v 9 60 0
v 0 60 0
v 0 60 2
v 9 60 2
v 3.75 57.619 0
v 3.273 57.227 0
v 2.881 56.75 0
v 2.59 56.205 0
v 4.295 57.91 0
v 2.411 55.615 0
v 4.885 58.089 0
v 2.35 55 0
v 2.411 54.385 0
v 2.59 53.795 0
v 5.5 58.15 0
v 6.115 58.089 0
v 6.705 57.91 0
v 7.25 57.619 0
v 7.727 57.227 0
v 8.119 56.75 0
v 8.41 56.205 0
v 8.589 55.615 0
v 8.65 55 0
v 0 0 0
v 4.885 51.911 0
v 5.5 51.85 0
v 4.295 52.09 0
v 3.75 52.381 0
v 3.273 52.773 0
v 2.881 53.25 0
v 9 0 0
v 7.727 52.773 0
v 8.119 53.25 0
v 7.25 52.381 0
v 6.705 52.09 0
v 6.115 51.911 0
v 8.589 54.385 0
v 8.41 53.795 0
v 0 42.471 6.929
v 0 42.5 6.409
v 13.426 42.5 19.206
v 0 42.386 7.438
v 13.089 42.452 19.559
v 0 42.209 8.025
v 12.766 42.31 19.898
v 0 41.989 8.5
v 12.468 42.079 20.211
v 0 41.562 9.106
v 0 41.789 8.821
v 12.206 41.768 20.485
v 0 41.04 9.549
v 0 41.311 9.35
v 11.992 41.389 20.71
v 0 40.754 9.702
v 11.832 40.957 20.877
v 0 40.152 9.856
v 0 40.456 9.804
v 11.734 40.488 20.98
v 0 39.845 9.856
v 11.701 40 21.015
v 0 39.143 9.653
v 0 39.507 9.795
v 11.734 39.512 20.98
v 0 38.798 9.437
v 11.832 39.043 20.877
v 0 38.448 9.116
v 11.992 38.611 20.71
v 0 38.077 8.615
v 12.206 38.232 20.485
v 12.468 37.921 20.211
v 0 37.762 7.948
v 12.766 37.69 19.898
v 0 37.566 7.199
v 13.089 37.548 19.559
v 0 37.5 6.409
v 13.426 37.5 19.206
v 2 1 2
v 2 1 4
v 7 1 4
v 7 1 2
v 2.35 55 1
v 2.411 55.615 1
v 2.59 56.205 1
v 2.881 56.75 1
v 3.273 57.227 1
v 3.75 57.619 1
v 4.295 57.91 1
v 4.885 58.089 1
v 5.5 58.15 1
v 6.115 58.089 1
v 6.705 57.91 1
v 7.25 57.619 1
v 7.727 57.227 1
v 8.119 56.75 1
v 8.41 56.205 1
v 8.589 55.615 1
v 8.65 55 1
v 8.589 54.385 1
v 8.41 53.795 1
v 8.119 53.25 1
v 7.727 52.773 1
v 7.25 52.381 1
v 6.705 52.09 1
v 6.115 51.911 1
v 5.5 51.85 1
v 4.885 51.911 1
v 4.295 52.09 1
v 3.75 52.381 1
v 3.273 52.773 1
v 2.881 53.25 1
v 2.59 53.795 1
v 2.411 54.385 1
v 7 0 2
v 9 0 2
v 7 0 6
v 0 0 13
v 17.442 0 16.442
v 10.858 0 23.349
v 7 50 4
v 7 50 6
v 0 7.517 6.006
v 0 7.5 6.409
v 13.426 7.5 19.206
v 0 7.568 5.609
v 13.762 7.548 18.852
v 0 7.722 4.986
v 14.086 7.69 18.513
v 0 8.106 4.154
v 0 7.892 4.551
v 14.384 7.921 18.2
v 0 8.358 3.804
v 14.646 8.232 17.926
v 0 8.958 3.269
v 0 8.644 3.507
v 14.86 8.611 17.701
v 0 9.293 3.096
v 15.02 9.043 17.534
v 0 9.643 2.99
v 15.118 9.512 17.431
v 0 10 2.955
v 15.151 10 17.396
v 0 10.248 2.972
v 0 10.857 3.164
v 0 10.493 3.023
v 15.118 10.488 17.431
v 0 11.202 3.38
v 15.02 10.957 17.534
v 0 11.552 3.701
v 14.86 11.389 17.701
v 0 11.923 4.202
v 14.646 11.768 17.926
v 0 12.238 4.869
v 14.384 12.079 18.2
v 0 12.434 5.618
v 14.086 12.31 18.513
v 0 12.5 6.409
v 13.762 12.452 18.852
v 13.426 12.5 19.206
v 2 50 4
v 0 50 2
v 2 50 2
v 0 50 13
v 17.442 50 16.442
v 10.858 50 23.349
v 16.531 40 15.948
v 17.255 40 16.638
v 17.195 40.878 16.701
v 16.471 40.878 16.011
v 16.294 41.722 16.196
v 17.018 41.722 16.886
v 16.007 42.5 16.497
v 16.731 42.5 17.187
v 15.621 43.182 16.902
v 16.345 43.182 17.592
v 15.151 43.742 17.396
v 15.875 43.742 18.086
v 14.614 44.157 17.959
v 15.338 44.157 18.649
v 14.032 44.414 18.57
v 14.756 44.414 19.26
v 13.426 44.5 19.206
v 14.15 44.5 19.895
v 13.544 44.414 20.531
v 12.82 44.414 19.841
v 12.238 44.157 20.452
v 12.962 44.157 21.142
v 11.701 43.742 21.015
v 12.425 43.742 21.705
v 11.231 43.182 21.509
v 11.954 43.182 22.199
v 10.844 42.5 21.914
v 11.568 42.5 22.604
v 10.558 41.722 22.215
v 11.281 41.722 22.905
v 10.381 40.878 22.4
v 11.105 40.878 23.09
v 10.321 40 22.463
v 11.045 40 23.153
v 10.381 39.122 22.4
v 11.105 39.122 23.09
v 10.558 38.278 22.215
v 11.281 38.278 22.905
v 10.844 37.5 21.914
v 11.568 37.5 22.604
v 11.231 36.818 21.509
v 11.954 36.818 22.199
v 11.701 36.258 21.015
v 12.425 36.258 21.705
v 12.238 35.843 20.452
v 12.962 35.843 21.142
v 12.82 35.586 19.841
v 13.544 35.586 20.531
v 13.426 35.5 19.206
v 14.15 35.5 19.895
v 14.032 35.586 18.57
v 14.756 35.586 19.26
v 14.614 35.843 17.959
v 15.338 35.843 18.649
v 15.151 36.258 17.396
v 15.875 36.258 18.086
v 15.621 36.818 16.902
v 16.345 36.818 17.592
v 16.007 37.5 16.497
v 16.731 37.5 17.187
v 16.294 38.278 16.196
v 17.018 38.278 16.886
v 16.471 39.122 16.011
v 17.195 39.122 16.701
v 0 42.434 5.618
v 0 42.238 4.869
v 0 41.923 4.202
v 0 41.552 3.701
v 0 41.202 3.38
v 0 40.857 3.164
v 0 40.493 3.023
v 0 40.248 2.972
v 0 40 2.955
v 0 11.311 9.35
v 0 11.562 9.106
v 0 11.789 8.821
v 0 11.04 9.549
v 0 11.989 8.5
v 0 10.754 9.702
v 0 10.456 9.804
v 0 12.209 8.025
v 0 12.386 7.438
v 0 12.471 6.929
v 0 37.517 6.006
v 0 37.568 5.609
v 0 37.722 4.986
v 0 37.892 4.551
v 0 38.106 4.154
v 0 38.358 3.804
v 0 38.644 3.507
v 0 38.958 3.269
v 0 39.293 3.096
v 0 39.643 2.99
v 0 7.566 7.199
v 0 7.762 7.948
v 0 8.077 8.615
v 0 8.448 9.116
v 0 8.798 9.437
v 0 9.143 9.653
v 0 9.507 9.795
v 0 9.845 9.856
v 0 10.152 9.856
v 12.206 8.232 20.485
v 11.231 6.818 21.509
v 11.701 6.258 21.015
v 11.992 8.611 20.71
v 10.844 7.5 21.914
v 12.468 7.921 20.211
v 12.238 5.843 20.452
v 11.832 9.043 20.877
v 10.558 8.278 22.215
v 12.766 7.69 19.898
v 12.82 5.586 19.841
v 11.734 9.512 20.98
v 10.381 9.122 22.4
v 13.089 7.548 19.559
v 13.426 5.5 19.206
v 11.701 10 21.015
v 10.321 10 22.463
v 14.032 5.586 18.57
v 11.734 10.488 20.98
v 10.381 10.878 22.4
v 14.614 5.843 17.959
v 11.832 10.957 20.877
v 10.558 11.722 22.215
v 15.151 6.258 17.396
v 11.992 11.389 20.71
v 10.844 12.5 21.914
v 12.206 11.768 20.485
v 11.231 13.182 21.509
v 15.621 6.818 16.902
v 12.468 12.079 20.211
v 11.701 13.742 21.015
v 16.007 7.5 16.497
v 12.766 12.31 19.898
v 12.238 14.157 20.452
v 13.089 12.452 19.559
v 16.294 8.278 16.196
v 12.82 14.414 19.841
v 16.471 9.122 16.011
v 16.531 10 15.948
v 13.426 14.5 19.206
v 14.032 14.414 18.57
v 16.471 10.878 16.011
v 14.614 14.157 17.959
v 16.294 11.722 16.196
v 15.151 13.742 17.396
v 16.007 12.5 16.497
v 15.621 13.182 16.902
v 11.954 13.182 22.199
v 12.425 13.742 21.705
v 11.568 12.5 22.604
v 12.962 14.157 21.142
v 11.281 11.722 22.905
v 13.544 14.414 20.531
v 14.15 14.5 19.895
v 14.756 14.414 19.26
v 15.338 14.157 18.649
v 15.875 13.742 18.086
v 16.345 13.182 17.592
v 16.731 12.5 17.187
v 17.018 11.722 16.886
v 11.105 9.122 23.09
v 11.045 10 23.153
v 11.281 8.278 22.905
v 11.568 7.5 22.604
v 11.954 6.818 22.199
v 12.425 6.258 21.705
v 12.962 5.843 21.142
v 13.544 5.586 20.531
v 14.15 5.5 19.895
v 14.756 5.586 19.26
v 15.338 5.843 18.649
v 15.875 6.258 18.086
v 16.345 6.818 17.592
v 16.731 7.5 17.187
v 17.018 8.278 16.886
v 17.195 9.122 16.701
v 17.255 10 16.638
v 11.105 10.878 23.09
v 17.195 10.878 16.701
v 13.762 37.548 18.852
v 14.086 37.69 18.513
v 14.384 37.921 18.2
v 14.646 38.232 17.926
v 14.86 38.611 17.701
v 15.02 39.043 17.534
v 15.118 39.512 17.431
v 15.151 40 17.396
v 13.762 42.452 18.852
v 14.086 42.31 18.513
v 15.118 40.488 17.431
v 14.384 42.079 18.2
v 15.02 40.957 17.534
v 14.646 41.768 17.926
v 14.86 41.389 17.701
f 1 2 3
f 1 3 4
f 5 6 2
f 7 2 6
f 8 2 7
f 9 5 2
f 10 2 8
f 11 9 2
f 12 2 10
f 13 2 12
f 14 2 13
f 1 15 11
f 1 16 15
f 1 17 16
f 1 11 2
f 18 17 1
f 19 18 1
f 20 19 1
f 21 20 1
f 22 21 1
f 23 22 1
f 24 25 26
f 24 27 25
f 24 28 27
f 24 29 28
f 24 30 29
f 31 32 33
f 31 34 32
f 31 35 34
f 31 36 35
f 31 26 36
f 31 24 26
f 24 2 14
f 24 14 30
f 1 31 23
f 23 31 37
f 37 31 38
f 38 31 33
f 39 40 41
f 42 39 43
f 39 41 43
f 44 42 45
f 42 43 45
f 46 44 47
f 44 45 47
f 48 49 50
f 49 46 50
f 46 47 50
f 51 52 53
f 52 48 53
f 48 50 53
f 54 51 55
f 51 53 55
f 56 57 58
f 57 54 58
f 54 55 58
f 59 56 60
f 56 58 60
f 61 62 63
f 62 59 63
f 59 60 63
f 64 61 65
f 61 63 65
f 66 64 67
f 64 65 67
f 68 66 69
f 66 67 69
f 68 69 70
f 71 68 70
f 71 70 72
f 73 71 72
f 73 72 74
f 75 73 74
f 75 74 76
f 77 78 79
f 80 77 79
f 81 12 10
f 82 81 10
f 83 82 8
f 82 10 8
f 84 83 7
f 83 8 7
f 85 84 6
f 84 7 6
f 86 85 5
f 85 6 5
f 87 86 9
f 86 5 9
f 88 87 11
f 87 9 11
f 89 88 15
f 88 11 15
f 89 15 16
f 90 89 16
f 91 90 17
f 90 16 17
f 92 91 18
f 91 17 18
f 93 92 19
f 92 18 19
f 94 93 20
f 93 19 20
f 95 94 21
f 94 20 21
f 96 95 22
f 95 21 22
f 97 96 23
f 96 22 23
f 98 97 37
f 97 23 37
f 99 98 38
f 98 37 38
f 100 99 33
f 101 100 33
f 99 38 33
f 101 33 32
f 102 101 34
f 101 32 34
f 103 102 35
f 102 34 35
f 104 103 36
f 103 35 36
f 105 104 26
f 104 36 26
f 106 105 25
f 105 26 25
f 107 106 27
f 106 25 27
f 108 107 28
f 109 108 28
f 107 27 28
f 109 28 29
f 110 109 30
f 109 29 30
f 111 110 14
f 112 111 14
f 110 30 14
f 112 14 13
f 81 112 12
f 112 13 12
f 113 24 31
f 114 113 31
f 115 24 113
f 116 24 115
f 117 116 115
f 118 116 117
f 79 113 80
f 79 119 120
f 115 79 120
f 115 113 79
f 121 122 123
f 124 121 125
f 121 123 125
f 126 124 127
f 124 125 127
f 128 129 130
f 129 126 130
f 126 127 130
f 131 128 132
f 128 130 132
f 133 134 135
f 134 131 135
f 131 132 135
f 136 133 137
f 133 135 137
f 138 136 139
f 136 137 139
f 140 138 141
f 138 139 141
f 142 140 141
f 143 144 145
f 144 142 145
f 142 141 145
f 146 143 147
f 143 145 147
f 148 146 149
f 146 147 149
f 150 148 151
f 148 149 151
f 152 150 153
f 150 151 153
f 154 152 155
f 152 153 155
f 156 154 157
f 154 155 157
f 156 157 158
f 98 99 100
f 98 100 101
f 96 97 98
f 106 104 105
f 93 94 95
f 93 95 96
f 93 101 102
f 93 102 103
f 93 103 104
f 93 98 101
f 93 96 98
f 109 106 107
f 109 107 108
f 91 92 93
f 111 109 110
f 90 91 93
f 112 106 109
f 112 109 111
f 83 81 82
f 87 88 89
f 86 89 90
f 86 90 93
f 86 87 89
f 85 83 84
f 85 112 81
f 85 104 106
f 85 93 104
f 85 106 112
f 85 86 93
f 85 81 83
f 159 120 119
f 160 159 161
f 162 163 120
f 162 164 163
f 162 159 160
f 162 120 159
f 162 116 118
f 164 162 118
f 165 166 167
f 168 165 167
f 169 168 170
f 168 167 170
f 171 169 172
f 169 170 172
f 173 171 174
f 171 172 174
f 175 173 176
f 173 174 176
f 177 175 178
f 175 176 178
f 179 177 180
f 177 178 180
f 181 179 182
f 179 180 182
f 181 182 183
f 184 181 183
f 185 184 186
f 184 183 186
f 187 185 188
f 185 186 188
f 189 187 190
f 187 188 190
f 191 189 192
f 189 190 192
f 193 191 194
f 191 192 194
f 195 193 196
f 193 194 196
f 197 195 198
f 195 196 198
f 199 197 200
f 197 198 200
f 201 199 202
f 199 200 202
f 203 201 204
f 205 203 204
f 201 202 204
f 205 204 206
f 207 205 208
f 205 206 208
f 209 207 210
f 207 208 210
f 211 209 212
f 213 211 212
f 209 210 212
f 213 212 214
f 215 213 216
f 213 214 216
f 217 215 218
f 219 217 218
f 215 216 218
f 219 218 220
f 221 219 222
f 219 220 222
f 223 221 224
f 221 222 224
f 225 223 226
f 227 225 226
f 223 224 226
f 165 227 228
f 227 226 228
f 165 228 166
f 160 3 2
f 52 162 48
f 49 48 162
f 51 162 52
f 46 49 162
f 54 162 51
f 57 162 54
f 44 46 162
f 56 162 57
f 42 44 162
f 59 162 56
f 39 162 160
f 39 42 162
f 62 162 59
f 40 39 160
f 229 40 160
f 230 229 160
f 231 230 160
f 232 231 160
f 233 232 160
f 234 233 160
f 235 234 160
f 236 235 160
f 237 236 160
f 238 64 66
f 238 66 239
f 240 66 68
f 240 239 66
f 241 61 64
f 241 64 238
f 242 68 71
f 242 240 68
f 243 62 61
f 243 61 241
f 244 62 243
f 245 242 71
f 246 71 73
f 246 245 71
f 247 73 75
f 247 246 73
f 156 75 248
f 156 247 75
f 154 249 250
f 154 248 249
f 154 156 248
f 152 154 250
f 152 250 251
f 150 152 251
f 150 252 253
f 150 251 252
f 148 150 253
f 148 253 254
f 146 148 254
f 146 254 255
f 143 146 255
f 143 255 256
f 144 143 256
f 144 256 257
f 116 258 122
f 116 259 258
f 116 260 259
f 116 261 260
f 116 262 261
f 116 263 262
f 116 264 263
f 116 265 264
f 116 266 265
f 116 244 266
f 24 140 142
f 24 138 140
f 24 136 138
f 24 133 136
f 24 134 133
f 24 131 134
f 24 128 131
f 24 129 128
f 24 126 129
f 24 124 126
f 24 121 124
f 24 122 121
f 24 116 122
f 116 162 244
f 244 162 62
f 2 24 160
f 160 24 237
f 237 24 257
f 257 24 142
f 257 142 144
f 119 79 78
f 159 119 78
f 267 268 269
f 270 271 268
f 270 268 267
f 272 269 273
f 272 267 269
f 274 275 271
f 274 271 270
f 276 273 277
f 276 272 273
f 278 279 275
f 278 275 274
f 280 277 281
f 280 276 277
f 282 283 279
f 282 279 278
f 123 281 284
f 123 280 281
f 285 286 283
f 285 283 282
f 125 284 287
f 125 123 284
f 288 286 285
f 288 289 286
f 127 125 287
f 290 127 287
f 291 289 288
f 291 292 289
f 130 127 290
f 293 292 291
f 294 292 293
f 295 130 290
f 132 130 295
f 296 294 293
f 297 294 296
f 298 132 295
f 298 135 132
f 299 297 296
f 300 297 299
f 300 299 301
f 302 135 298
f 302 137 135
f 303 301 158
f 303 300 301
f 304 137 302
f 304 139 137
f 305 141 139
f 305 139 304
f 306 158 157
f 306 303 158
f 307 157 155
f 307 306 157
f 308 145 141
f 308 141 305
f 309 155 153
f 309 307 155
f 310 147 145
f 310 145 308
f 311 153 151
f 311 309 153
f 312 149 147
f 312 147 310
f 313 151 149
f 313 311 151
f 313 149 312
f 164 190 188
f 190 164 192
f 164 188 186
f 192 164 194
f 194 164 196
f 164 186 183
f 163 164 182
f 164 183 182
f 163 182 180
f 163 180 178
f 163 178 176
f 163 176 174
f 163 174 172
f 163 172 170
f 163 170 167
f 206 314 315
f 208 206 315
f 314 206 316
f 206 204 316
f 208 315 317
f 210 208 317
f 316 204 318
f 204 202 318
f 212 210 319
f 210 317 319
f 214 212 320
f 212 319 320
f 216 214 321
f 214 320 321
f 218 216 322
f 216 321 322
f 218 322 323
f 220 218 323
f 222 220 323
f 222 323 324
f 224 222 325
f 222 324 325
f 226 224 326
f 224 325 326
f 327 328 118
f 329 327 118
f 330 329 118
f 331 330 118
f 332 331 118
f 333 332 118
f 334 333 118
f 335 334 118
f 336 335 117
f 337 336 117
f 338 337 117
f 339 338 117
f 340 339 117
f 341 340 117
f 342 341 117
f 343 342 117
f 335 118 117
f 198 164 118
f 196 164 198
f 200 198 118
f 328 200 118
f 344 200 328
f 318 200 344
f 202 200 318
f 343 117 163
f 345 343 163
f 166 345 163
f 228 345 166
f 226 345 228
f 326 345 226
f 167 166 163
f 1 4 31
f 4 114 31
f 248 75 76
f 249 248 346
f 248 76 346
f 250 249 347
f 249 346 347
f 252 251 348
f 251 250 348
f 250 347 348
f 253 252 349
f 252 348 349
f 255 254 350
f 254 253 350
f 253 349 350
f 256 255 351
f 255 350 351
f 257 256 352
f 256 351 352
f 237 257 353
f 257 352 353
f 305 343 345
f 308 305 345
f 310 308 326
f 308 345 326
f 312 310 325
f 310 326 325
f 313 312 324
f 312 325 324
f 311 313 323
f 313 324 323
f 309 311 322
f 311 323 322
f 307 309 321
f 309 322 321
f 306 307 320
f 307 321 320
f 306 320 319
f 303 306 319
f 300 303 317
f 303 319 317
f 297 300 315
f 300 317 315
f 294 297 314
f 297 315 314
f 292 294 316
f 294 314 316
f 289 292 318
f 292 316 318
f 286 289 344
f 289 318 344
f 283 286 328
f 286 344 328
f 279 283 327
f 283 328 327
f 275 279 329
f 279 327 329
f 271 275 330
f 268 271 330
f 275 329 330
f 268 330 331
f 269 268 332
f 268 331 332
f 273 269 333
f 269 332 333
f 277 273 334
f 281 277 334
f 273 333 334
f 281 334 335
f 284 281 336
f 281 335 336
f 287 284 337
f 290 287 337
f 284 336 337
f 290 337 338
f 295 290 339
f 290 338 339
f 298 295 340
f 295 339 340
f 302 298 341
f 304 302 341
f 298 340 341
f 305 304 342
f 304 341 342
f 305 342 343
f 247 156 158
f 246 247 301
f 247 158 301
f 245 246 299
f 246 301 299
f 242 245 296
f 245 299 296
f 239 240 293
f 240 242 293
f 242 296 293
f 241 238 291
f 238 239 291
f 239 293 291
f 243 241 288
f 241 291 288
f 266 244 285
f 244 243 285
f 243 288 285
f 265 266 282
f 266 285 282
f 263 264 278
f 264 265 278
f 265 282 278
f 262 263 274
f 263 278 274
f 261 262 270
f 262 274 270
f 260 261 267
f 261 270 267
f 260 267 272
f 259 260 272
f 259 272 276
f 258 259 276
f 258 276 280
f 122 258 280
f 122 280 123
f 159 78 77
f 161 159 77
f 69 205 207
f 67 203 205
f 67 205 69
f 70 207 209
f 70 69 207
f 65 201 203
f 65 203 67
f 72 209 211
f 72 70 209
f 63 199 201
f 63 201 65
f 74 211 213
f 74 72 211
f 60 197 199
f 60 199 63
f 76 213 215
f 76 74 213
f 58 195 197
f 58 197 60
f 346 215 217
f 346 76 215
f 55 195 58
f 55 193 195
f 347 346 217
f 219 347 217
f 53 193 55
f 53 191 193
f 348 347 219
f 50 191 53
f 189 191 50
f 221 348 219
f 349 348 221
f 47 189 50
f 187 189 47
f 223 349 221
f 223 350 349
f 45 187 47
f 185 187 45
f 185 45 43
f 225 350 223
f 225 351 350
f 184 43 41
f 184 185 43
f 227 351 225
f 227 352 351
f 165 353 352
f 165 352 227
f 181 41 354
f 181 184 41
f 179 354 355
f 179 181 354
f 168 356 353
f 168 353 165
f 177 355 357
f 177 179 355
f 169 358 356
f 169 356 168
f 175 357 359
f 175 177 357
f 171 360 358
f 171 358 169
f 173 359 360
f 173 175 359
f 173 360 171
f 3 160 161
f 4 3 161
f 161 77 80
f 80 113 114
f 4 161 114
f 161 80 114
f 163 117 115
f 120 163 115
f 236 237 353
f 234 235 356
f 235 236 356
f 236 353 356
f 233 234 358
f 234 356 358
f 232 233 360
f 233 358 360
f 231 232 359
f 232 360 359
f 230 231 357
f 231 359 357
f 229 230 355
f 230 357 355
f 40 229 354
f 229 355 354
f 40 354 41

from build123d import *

# Parameters (mm, degrees)
BOSS_EXTRUDE1_DEPTH = 50
SKETCH2_W           = 9
SKETCH2_H           = 2
BOSS_EXTRUDE2_DEPTH = 10
SKETCH3_R           = 3.15
CUT_EXTRUDE1_DEPTH  = 1
BOSS_EXTRUDE3_DEPTH = 50
SKETCH5_W           = 5
SKETCH5_H           = 2
BOSS_EXTRUDE4_DEPTH = 1
SKETCH6_R           = 4.5
SKETCH6_R_2         = 2.5
CUT_EXTRUDE2_DEPTH  = 1
SKETCH6_2_R         = 2.5
CUT_EXTRUDE3_DEPTH  = 65.610577824


with BuildPart() as part:
    # Sketch1 → Boss-Extrude1 (new body)
    with BuildSketch(Plane(origin=(0, 0, 0), x_dir=(1, 0, 0), z_dir=(0, 1, 0))):
        Polygon((0, 0), (0, -6), (7, -6), (7, -4), (2, -4), (2, -2), (9, -2), (9, 0), align=None)
    extrude(amount=BOSS_EXTRUDE1_DEPTH)

    # Sketch2 → Boss-Extrude2 (add)
    with BuildSketch(Plane(origin=(0, 50, 0), x_dir=(1, 0, 0), z_dir=(0, 1, 0))):
        with Locations((4.5, -1)):
            Rectangle(SKETCH2_W, SKETCH2_H)
    extrude(amount=BOSS_EXTRUDE2_DEPTH)

    # Sketch3 → Cut-Extrude1 (cut)
    with BuildSketch(Plane(origin=(0, 0, 0), x_dir=(-1, 0, 0), z_dir=(0, 0, -1))):
        with Locations((-5.5, 55)):
            Circle(SKETCH3_R)
    extrude(amount=-CUT_EXTRUDE1_DEPTH, mode=Mode.SUBTRACT)

    # Sketch4 → Boss-Extrude3 (add)
    with BuildSketch(Plane.XZ):
        Polygon((0, 6), (7, 6), (17.441727636, 16.441727636), (10.857923623, 23.349178451), (0, 13), align=None)
    extrude(amount=-BOSS_EXTRUDE3_DEPTH)

    # Sketch5 → Boss-Extrude4 (add)
    with BuildSketch(Plane.XZ):
        with Locations((4.5, 3)):
            Rectangle(SKETCH5_W, SKETCH5_H)
    extrude(amount=-BOSS_EXTRUDE4_DEPTH)

    # Sketch6 → Cut-Extrude2 (cut)
    # profile 1 of 2: a face of its own
    with BuildSketch(Plane(origin=(17.350446553, 0, 16.537495917), x_dir=(0.6899452300561162, 0, -0.7238615748351429), z_dir=(0.7238615748351429, 0, 0.6899452300561162))):
        with Locations((-4.638949273, 40)):
            Circle(SKETCH6_R)
        with Locations((-4.638949273, 40)):
            Circle(SKETCH6_R_2, mode=Mode.SUBTRACT)
    # profile 2 of 2: a face of its own
    with BuildSketch(Plane(origin=(17.350446553, 0, 16.537495917), x_dir=(0.6899452300561162, 0, -0.7238615748351429), z_dir=(0.7238615748351429, 0, 0.6899452300561162))):
        with Locations((-4.638949273, 10)):
            Circle(SKETCH6_R)
        with Locations((-4.638949273, 10)):
            Circle(SKETCH6_R_2, mode=Mode.SUBTRACT)
    extrude(amount=-CUT_EXTRUDE2_DEPTH, mode=Mode.SUBTRACT)

    # Sketch6<2> → Cut-Extrude3 (cut, through all)
    with BuildSketch(Plane(origin=(17.350446553, 0, 16.537495917), x_dir=(0.6899452300561162, 0, -0.7238615748351429), z_dir=(0.7238615748351429, 0, 0.6899452300561162))):
        with Locations((-4.638949273, 40)):
            Circle(SKETCH6_2_R)
        with Locations((-4.638949273, 10)):
            Circle(SKETCH6_2_R)
    extrude(amount=-CUT_EXTRUDE3_DEPTH, mode=Mode.SUBTRACT)


solid = part.part
